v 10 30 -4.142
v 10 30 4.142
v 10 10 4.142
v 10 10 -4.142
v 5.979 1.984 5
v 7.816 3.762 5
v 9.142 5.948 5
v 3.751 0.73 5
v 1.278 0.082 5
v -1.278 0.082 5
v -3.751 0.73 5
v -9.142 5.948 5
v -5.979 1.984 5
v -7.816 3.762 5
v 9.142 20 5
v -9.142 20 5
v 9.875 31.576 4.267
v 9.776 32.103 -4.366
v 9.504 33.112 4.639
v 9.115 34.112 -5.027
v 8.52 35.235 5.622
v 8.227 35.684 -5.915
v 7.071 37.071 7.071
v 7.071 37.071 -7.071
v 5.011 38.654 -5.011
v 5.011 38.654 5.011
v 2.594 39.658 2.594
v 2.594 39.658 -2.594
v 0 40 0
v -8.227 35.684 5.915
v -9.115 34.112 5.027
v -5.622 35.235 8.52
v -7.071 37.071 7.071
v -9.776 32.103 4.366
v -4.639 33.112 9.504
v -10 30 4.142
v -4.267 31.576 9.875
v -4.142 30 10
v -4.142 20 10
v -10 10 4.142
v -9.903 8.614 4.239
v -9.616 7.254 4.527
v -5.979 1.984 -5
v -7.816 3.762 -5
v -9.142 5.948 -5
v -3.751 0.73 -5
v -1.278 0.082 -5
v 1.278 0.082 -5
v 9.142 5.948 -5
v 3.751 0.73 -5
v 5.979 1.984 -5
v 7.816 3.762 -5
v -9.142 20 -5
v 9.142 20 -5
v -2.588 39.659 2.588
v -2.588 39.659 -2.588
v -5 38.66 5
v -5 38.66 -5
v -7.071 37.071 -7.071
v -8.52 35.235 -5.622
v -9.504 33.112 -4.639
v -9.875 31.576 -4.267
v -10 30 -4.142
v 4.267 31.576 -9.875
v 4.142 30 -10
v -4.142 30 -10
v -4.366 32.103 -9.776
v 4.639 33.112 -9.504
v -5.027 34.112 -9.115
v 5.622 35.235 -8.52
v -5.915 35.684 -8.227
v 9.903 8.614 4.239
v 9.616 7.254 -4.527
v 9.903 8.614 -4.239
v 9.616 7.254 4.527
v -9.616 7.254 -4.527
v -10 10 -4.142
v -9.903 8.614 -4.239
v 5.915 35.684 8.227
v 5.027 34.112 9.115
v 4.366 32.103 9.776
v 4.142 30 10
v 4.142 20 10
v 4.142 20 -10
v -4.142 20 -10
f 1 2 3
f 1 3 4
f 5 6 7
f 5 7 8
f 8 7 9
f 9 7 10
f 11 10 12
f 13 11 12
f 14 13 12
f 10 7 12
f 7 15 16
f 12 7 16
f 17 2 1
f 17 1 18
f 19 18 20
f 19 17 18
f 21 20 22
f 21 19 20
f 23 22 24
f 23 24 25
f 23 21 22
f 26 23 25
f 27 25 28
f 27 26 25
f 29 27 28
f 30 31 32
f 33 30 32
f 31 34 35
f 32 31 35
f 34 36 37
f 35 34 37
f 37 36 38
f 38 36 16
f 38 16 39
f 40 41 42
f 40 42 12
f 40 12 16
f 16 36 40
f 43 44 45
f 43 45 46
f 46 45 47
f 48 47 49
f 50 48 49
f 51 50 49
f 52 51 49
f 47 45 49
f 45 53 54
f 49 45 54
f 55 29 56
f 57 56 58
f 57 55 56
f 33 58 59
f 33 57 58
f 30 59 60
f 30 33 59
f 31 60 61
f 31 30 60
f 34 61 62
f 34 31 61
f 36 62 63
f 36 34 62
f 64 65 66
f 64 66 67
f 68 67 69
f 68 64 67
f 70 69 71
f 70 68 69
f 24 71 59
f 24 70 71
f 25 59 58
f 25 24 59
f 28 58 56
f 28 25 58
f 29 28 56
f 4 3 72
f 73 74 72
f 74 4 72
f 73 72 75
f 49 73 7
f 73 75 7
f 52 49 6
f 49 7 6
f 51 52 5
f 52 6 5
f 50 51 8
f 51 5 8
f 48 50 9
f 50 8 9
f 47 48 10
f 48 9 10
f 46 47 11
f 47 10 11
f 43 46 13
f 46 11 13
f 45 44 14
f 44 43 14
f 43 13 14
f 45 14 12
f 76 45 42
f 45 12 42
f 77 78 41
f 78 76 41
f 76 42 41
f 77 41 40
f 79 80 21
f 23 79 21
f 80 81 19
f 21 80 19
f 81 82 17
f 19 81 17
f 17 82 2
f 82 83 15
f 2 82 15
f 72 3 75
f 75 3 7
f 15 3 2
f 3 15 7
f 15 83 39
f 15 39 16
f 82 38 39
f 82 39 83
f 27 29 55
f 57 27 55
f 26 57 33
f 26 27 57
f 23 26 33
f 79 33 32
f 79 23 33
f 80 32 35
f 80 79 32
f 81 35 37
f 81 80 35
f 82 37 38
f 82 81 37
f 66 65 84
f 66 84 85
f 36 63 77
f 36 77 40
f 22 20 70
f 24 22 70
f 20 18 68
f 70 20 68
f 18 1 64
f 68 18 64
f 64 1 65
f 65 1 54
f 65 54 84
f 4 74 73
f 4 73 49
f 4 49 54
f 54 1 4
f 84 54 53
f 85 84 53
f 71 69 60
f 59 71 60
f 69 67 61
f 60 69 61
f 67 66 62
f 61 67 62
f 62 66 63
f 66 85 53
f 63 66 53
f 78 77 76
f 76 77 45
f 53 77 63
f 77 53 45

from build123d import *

# Parameters (mm, degrees)
EXTRUDE_1_DEPTH     = 48
CUT_EXTRUDE_1_DEPTH = 66
CUT_EXTRUDE_2_DEPTH = 5
CUT_EXTRUDE_START   = -5
CUT_EXTRUDE_3_DEPTH = 5
CUT_EXTRUDE_5_DEPTH = 30
CUT_EXTRUDE_6_DEPTH = 30


with BuildPart() as part:
    # 草图1 → 凸台-拉伸1 (new body)
    with BuildSketch(Plane(origin=(0, 0, 0), x_dir=(1, 0, 0), z_dir=(0, 1, 0))):
        Polygon((10, 4.142135624), (4.142135624, 10), (-4.142135624, 10), (-10, 4.142135624), (-10, -4.142135624), (-4.142135624, -10), (4.142135624, -10), (10, -4.142135624), align=None)
    extrude(amount=EXTRUDE_1_DEPTH)

    # 草图2 → 切除-拉伸1 (cut)
    with BuildSketch(Plane.XY.offset(10)):
        with BuildLine():
            Line((-10, 10), (-10, -2.389295552))
            Line((-10, -2.389295552), (10, -2.389295552))
            Line((10, -2.389295552), (10, 10))
            ThreePointArc((10, 10), (0, 0), (-10, 10))
        make_face()
    extrude(amount=-CUT_EXTRUDE_1_DEPTH, mode=Mode.SUBTRACT)

    # 草图4 → 切除-拉伸2 (cut)
    with BuildSketch(Plane.XY.offset(10)):
        with BuildLine():
            Line((-10, 10), (-10, 20))
            Line((-10, 20), (10, 20))
            Line((10, 20), (10, 10))
            ThreePointArc((10, 10), (0, 0), (-10, 10))
        make_face()
    extrude(amount=-CUT_EXTRUDE_2_DEPTH, mode=Mode.SUBTRACT)

    # 草图5 → 切除-拉伸3 (cut)
    with BuildSketch(Plane(origin=(0, 0, -10), x_dir=(-1, 0, 0), z_dir=(0, 0, -1)).offset(CUT_EXTRUDE_START)):
        with BuildLine():
            Line((-10, 10), (-10, 20))
            Line((-10, 20), (10, 20))
            Line((10, 20), (10, 10))
            ThreePointArc((10, 10), (0, 0), (-10, 10))
        make_face()
    extrude(amount=CUT_EXTRUDE_3_DEPTH, mode=Mode.SUBTRACT)

    # 草图7 → 切除-拉伸5 (cut)
    with BuildSketch(Plane.XY.offset(10)):
        with BuildLine():
            Line((-10, 30), (-10, 50.94058397))
            Line((-10, 50.94058397), (10, 50.94058397))
            Line((10, 50.94058397), (10, 30))
            ThreePointArc((10, 30), (0, 40), (-10, 30))
        make_face()
    extrude(amount=-CUT_EXTRUDE_5_DEPTH, mode=Mode.SUBTRACT)

    # 草图8 → 切除-拉伸6 (cut)
    with BuildSketch(Plane(origin=(10, 0, 0), x_dir=(0, 0, -1), z_dir=(1, 0, 0))):
        with BuildLine():
            Line((-10, 30), (-10, 44.07560735))
            Line((-10, 44.07560735), (10, 44.07560735))
            Line((10, 44.07560735), (10, 30))
            ThreePointArc((10, 30), (0, 40), (-10, 30))
        make_face()
    extrude(amount=-CUT_EXTRUDE_6_DEPTH, mode=Mode.SUBTRACT)


solid = part.part
